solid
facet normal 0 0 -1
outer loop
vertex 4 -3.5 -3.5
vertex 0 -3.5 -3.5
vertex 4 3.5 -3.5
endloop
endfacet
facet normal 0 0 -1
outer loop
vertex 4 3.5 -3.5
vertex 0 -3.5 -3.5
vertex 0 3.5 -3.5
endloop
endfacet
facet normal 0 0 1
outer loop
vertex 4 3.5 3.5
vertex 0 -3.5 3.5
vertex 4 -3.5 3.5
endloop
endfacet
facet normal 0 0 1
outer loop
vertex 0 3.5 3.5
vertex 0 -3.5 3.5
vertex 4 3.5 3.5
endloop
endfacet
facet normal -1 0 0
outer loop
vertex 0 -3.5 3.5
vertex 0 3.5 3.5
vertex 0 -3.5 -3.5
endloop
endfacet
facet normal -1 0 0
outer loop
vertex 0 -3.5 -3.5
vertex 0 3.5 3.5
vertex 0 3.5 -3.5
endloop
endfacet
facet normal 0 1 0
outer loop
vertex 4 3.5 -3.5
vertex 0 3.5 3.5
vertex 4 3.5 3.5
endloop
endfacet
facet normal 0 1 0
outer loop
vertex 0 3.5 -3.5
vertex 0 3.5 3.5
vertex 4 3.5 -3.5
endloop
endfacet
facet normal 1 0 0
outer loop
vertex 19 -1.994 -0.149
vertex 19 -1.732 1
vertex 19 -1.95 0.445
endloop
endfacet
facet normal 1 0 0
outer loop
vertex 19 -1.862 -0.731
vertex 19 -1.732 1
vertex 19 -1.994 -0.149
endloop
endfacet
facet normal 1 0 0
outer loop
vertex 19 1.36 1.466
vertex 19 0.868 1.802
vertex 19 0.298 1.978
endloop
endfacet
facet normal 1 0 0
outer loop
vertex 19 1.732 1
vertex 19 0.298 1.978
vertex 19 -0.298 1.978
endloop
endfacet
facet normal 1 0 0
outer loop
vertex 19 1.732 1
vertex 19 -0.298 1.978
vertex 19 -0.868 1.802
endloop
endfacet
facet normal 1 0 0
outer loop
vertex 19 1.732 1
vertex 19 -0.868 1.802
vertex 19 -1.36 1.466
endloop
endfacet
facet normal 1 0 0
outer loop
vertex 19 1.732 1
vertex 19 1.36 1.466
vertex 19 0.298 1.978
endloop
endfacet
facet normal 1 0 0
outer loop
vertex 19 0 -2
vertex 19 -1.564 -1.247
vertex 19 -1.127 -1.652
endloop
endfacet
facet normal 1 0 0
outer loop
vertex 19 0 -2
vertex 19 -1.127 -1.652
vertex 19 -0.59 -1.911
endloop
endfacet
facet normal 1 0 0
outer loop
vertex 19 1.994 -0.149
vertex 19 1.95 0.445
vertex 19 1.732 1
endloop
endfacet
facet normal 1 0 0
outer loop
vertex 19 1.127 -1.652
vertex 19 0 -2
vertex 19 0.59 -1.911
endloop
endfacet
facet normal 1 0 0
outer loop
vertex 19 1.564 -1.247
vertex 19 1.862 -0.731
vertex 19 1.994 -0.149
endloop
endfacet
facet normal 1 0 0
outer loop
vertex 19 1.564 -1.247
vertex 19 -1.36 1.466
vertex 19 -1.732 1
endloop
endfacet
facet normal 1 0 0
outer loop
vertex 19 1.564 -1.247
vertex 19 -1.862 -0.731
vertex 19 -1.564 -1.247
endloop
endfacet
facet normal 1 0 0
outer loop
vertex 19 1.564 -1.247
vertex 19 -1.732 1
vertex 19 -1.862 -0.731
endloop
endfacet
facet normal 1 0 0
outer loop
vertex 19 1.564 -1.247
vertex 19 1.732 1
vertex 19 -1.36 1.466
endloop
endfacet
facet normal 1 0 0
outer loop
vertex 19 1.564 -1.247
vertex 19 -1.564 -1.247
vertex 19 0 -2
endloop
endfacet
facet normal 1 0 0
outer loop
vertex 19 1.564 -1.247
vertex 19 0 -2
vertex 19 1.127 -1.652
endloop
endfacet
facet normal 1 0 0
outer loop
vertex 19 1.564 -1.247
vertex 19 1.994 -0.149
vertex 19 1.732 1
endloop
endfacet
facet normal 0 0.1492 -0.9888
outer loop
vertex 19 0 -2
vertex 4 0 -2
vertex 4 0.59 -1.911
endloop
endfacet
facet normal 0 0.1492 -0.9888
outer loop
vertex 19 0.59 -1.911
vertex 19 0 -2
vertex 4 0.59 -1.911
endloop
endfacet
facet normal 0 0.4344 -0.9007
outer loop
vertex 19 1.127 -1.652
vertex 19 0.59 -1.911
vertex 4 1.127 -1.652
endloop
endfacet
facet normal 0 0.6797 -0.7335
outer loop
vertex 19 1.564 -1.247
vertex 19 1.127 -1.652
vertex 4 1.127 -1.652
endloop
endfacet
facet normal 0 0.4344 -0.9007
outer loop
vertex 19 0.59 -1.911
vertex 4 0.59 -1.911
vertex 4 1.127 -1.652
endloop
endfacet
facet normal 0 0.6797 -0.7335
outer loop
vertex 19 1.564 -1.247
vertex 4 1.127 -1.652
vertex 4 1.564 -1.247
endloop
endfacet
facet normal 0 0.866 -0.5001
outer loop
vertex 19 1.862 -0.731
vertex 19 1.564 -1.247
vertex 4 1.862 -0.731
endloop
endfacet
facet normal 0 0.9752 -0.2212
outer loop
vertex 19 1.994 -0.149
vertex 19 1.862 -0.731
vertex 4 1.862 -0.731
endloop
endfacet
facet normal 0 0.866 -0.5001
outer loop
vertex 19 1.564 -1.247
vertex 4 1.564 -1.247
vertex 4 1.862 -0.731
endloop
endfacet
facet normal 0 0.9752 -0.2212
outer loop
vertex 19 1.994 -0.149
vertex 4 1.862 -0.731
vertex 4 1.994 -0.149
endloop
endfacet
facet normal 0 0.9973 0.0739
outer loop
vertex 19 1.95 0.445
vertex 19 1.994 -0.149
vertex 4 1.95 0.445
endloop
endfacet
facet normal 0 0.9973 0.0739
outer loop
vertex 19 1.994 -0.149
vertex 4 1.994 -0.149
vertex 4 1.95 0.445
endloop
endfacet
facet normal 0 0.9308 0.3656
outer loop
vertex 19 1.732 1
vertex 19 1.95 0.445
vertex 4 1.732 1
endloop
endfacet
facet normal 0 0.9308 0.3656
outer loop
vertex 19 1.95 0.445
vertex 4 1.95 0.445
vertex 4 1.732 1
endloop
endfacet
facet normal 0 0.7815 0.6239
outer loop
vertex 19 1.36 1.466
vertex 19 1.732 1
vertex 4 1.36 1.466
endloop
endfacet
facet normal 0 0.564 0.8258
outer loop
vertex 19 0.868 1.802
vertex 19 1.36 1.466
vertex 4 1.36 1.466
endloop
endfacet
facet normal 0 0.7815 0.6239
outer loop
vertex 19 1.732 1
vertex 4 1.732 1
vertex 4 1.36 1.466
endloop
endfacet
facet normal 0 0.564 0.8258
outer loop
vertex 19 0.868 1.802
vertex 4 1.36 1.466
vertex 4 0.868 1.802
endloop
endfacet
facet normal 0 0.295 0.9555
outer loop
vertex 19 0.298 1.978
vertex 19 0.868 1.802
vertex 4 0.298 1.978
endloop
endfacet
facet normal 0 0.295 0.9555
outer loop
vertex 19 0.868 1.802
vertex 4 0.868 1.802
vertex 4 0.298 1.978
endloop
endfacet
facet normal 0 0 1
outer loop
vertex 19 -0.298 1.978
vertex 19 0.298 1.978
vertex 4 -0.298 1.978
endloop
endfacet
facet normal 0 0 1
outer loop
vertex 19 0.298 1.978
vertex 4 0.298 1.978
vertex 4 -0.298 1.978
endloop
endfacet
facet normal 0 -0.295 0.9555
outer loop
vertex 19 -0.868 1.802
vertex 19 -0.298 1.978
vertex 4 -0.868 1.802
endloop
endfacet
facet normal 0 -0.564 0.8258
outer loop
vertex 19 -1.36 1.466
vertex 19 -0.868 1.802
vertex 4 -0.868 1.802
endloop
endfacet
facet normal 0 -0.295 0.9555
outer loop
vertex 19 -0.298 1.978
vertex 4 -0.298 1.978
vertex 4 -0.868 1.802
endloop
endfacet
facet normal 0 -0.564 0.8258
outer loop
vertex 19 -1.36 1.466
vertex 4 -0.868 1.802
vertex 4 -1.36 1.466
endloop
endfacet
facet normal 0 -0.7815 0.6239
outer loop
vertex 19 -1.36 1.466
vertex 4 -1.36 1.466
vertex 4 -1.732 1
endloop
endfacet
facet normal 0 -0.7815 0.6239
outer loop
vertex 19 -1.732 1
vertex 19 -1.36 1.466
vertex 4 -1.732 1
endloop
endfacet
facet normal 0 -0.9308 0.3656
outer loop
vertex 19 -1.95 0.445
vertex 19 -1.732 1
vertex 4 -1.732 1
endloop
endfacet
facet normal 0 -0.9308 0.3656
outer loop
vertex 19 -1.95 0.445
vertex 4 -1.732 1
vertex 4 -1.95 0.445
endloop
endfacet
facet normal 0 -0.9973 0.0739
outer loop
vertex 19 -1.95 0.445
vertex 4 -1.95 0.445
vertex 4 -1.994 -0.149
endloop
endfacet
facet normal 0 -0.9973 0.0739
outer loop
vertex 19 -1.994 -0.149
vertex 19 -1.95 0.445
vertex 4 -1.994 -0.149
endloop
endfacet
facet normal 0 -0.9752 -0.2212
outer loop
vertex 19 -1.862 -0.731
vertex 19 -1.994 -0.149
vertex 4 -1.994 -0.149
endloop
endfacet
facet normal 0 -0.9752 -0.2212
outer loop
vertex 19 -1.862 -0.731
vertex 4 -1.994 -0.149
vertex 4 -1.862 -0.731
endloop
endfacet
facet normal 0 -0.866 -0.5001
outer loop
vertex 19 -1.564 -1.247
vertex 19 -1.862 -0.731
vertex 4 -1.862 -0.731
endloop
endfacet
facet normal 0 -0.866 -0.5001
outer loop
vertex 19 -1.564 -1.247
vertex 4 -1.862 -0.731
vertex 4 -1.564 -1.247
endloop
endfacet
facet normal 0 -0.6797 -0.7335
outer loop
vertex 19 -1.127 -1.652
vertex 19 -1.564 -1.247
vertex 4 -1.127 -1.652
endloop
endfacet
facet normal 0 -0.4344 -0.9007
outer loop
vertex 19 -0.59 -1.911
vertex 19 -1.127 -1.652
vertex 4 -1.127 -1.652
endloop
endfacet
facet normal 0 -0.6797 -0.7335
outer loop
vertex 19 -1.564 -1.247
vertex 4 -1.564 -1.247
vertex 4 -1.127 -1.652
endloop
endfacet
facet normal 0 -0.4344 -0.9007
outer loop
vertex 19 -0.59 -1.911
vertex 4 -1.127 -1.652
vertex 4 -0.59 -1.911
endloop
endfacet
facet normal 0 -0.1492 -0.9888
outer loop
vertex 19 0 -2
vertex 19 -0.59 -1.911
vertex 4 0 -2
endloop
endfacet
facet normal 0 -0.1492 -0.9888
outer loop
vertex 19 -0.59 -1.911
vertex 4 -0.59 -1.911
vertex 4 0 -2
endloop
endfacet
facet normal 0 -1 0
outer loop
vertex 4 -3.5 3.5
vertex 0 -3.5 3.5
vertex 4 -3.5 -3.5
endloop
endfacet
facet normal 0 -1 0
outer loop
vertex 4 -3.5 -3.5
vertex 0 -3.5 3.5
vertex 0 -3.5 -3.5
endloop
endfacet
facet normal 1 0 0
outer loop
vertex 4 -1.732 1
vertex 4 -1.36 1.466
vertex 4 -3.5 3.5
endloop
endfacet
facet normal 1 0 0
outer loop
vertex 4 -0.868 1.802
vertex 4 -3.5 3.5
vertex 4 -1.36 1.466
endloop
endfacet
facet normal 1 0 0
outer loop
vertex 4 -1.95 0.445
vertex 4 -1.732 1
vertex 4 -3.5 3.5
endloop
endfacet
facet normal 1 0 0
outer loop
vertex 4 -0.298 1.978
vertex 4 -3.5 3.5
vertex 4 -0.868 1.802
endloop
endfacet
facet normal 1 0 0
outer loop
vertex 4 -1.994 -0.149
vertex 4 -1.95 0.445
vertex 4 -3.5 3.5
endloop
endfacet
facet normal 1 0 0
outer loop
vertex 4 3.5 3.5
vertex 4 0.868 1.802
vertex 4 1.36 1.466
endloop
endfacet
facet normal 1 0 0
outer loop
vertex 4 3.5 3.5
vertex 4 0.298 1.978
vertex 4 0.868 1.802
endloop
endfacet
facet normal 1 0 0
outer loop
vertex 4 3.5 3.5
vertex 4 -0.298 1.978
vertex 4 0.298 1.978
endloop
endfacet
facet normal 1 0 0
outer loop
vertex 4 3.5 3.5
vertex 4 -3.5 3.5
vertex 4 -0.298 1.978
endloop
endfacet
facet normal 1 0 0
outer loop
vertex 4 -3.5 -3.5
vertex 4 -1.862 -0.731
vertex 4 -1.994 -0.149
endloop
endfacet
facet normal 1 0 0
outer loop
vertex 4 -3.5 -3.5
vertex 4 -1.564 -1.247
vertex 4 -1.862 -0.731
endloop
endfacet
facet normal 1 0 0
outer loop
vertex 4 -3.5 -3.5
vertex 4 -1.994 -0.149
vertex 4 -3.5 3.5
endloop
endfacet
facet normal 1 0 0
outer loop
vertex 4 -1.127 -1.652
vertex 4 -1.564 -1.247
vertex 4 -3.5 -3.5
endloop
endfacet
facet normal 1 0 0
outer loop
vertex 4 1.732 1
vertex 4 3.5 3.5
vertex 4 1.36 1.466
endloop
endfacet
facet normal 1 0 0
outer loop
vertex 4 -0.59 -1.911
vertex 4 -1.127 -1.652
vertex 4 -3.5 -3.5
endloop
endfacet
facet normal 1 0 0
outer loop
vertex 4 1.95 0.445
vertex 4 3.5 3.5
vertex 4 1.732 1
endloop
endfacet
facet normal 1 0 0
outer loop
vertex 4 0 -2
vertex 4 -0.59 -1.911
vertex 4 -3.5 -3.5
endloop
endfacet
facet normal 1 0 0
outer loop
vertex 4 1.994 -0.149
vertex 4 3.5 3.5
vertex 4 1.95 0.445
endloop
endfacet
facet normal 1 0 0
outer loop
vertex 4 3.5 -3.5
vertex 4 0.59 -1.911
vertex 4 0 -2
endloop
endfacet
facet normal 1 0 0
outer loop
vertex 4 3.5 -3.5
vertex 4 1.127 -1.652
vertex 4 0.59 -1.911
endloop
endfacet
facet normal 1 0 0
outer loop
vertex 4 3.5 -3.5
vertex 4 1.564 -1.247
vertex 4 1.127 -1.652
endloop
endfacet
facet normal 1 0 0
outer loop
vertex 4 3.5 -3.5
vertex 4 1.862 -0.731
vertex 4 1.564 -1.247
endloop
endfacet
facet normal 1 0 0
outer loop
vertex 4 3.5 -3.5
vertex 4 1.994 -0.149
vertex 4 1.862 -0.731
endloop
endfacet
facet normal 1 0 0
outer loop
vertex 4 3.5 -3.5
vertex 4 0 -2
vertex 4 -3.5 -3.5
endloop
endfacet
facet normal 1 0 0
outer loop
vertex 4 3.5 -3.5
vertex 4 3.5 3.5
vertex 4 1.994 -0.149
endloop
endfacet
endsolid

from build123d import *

# Parameters (mm, degrees)
SKETCH3_W           = 7
SKETCH3_H           = 7
BOSS_EXTRUDE2_DEPTH = 4
SKETCH4_R           = 2
BOSS_EXTRUDE3_DEPTH = 15


with BuildPart() as part:
    # Sketch3 → Boss-Extrude2 (new body)
    with BuildSketch(Plane(origin=(0, 0, 0), x_dir=(0, 0, -1), z_dir=(1, 0, 0))):
        Rectangle(SKETCH3_W, SKETCH3_H)
    extrude(amount=BOSS_EXTRUDE2_DEPTH)

    # Sketch4 → Boss-Extrude3 (add)
    with BuildSketch(Plane(origin=(4, 0, 0), x_dir=(0, 0, -1), z_dir=(1, 0, 0))):
        Circle(SKETCH4_R)
    extrude(amount=BOSS_EXTRUDE3_DEPTH)


solid = part.part
